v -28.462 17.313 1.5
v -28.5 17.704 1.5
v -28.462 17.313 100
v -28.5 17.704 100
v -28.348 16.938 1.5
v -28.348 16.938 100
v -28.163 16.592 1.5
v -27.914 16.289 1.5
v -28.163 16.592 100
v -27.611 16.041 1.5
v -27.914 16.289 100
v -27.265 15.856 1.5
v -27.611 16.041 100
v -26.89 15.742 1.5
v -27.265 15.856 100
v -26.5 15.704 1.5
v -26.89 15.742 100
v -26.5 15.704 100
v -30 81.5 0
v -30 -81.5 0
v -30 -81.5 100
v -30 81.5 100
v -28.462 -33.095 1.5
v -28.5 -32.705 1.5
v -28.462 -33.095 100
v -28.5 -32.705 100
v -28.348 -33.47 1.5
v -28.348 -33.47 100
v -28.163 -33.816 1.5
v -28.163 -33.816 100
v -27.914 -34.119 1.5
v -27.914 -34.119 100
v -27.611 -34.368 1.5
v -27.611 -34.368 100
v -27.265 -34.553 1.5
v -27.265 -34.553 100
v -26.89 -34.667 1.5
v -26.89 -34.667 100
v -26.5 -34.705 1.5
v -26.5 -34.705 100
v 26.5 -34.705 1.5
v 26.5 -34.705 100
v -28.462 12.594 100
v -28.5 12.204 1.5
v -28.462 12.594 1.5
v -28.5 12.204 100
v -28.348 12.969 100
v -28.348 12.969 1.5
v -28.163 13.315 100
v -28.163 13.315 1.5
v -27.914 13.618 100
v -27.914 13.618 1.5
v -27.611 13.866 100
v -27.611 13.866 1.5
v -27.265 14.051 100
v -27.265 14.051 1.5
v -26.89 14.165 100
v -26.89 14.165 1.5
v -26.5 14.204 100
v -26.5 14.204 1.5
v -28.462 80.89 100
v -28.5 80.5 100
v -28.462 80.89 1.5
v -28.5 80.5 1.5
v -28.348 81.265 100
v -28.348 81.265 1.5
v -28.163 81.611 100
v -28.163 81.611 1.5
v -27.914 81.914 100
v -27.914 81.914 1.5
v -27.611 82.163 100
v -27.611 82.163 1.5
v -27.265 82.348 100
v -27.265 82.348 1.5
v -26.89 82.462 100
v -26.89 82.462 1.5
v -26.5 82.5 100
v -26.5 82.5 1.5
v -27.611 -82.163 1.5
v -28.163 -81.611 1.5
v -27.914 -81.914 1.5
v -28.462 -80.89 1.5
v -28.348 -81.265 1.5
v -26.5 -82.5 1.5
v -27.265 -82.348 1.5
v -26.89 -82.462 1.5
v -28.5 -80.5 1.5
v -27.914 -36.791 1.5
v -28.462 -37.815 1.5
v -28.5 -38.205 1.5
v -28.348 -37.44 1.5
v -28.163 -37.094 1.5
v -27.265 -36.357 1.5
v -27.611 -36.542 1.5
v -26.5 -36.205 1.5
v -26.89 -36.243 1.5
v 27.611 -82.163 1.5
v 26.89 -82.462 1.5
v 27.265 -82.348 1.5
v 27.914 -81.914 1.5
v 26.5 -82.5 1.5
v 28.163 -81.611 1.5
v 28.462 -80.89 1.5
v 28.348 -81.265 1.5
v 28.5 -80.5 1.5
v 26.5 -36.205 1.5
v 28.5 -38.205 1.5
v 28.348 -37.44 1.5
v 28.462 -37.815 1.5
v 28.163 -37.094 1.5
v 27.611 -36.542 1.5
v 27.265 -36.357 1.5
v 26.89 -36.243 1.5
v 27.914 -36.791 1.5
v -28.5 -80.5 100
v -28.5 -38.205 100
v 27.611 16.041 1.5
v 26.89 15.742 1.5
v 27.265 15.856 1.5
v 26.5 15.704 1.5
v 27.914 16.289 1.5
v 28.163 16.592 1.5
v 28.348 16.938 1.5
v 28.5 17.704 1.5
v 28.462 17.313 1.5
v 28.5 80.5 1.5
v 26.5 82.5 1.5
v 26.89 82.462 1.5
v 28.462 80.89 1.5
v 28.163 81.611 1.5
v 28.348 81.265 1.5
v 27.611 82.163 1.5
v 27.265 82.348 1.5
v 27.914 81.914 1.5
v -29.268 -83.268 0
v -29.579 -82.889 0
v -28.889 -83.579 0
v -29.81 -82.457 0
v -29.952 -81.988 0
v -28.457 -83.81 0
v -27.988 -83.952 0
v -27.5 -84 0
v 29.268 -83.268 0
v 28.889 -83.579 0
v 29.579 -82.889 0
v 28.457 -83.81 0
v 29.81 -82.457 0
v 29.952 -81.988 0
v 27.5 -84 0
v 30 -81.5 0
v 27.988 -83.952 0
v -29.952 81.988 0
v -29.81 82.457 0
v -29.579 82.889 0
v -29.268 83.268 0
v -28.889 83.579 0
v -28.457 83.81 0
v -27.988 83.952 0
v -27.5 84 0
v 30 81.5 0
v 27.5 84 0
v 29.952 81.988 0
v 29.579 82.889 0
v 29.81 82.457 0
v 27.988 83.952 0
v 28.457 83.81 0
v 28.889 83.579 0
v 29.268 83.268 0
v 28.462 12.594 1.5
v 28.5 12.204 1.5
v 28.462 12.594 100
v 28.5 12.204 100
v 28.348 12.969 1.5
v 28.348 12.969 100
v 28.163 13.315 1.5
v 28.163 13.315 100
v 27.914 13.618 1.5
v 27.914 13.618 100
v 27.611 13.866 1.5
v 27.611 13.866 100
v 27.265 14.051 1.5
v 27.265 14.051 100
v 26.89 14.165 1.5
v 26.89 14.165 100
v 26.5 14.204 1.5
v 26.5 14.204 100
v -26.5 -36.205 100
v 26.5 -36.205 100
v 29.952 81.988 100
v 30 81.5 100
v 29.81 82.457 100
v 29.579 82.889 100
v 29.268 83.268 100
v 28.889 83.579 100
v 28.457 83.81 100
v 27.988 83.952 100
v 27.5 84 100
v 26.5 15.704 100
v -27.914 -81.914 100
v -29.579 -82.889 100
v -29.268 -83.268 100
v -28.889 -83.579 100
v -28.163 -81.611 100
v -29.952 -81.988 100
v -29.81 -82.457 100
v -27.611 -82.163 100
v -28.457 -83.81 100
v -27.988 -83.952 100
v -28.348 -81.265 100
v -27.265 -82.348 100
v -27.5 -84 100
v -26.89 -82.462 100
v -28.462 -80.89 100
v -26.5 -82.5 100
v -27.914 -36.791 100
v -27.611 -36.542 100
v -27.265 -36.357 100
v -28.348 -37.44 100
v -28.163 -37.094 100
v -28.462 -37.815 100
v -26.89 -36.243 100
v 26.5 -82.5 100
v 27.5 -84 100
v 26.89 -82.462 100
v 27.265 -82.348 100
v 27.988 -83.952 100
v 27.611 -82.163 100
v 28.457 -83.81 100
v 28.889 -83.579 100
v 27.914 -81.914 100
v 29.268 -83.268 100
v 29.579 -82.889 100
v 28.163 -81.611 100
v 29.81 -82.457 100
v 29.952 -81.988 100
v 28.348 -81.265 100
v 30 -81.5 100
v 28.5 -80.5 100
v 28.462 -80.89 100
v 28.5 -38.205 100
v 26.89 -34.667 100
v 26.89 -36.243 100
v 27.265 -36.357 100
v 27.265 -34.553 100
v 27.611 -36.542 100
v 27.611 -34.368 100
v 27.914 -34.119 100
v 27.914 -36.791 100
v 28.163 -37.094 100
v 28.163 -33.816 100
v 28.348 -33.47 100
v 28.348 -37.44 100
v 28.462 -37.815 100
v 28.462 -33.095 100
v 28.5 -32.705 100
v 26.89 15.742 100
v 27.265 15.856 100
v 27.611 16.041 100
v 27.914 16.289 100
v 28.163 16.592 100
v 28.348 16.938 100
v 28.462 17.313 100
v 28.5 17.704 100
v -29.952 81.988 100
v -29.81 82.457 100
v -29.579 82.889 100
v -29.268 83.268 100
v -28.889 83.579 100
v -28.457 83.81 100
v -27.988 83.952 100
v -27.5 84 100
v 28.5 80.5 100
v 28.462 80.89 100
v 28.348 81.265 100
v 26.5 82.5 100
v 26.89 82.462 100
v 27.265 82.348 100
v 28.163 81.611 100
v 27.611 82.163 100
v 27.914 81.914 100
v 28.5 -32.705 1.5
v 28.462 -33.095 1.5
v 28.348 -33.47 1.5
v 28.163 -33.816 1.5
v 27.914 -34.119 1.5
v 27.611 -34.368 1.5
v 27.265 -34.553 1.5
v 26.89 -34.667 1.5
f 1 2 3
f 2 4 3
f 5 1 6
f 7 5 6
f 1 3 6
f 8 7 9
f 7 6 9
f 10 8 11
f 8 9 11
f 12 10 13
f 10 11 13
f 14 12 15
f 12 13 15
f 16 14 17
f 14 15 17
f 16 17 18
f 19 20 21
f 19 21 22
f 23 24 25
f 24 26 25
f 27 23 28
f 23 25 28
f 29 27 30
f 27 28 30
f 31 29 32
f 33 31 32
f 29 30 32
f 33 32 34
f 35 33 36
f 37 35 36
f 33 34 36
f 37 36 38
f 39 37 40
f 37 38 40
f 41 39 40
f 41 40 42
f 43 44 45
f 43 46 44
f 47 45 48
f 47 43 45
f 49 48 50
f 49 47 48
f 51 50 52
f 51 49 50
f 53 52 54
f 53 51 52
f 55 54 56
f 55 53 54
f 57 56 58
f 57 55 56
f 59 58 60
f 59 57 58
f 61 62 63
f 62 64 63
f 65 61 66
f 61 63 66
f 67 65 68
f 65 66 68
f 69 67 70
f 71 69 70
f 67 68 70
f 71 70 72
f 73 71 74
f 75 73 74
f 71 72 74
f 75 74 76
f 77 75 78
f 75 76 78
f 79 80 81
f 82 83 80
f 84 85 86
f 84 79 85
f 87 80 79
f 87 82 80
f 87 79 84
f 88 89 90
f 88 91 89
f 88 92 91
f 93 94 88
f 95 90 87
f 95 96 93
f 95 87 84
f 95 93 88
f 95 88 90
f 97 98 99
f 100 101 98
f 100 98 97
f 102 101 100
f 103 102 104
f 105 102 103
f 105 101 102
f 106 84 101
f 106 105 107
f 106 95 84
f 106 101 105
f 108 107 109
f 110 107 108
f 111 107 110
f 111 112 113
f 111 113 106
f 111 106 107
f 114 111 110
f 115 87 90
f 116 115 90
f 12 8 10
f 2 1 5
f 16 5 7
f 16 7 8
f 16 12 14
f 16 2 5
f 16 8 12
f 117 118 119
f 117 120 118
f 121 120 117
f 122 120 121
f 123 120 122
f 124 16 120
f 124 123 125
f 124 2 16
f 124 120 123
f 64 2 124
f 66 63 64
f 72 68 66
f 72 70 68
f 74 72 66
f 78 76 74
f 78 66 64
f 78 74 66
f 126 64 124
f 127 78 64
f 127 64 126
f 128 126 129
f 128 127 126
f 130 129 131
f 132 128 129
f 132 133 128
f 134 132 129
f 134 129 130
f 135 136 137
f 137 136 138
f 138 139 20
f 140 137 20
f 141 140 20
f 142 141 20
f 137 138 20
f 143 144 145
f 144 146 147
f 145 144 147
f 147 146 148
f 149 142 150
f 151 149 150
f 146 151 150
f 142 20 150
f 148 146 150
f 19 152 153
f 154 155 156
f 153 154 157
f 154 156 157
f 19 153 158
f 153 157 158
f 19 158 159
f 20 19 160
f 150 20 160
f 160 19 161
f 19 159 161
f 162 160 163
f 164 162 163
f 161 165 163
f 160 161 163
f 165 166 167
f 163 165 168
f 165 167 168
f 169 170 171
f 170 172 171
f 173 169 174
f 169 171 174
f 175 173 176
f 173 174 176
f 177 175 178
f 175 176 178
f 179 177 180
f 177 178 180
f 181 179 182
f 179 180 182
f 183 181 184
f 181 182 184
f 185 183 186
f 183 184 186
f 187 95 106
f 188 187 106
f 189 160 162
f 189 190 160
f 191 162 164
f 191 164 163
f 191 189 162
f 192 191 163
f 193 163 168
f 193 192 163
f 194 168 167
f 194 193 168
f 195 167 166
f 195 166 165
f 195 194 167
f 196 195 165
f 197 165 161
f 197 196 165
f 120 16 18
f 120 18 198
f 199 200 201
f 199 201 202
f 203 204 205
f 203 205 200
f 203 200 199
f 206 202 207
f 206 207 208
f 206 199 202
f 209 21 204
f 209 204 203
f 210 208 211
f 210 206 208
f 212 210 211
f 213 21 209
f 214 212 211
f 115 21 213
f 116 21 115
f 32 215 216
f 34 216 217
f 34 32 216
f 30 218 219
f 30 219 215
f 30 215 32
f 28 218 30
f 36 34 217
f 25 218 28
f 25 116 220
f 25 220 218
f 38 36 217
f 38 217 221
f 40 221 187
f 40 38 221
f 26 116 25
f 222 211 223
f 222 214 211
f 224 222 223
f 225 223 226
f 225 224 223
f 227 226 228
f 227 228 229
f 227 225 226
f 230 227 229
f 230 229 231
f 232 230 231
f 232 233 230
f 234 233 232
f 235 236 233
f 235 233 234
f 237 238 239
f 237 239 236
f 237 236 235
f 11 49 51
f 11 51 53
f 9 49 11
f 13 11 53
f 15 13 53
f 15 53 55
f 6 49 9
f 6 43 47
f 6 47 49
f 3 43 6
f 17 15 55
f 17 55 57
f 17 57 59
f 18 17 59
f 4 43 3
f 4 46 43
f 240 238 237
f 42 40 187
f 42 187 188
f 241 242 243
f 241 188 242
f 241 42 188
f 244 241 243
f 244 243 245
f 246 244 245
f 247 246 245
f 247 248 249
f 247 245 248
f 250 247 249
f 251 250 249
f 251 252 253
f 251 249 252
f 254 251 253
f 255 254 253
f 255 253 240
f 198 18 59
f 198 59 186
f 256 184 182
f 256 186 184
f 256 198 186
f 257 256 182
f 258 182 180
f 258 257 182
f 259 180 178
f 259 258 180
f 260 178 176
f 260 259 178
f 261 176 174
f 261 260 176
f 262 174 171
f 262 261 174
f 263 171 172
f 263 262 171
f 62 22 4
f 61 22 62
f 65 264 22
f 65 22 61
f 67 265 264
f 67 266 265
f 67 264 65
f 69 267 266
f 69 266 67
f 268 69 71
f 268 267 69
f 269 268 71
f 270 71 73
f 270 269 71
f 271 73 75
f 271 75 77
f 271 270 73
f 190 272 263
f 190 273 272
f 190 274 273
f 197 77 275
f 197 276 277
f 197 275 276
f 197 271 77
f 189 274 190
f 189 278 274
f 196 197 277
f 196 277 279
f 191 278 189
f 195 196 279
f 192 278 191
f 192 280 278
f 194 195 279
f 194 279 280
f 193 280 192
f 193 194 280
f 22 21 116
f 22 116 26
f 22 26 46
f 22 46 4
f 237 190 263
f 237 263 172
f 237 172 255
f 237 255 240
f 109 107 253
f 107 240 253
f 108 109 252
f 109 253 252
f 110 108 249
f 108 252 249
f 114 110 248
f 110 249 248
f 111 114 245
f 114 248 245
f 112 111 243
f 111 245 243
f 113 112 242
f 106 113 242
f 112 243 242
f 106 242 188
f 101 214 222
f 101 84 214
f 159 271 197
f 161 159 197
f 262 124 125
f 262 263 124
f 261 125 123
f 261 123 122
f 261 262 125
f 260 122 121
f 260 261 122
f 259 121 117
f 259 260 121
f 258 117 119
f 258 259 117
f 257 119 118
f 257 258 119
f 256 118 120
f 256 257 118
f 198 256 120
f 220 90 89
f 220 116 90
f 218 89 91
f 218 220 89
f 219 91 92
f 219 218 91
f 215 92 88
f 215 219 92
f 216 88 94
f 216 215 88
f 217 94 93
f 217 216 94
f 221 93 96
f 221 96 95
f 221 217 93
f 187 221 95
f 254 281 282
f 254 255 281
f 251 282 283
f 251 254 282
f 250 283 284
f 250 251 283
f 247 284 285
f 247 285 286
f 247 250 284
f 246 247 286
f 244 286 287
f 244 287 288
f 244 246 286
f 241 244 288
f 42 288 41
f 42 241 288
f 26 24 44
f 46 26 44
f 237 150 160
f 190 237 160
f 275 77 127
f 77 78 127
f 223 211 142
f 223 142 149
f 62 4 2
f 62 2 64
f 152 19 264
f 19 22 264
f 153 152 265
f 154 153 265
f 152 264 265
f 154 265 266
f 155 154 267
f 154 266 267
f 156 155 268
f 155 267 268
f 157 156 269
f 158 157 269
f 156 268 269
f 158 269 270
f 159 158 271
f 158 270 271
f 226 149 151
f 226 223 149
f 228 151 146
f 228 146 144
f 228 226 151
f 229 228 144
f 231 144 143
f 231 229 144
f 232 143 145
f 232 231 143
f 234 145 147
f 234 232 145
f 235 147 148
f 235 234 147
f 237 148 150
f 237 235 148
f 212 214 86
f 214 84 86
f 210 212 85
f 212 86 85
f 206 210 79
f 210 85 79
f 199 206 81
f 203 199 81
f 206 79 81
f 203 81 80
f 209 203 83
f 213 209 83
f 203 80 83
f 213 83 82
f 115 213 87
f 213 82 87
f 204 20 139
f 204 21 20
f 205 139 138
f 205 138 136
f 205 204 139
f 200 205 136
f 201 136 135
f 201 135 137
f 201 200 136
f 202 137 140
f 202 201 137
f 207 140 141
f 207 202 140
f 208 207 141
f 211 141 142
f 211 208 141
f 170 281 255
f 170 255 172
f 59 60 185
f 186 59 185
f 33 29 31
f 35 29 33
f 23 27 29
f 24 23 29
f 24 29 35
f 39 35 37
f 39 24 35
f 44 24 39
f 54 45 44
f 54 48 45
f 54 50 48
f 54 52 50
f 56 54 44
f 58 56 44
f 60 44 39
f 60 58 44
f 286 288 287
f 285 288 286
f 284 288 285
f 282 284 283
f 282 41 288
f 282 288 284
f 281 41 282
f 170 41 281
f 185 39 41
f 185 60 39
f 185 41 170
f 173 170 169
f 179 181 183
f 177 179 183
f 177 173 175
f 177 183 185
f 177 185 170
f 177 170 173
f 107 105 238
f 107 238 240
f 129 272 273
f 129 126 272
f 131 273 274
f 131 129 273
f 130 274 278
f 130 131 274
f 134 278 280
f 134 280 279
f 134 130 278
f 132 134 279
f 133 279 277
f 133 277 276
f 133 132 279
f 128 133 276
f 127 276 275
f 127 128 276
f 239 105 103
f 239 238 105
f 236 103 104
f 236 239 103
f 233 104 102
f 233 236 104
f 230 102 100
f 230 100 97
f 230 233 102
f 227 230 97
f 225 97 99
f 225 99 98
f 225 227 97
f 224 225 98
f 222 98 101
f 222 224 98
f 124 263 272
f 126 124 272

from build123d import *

# Parameters (mm, degrees)
F0_W     = 60
F0_H     = 168
F1_DEPTH = 100
F2_T     = -1.5
F3_W     = 57
F3_H     = 1.5
F4_DEPTH = 98.5
F5_R     = 2
F6_R     = 2.5


with BuildPart() as f1:
    # F0 (on Top) → F1 (new body)
    with BuildSketch(Plane.XY):
        Rectangle(F0_W, F0_H)
    extrude(amount=F1_DEPTH)

    # F2
    f2_openings = [f1.faces().sort_by_distance(p)[0] for p in [
        (0, 0, 100),
    ]]
    offset(amount=F2_T, openings=f2_openings)

    # F3 (on face) → F4 (join, through all)
    with BuildSketch(Plane.XY.offset(1.5)):
        with Locations((0, 14.9535381934)):
            Rectangle(F3_W, F3_H)
        with Locations((0, -35.4550533295)):
            Rectangle(F3_W, F3_H)
    extrude(amount=F4_DEPTH)

    # F5
    f5_edges = [f1.edges().sort_by_distance(p)[0] for p in [
        (-28.5, -82.5, 50.75),
        (-28.5, 14.203538, 50.75),
        (-28.5, 82.5, 50.75),
        (28.5, 82.5, 50.75),
        (28.5, 15.703538, 50.75),
        (28.5, -82.5, 50.75),
        (28.5, 14.203538, 50.75),
        (-28.5, 15.703538, 50.75),
        (-28.5, -36.205053, 50.75),
        (-28.5, -34.705053, 50.75),
        (28.5, -34.705053, 50.75),
        (28.5, -36.205053, 50.75),
    ]]
    fillet(f5_edges, radius=F5_R)

    # F6
    f6_edges = [f1.edges().sort_by_distance(p)[0] for p in [
        (30, -84, 50),
        (-30, -84, 50),
        (30, 84, 50),
        (-30, 84, 50),
    ]]
    fillet(f6_edges, radius=F6_R)


solid = f1.part
